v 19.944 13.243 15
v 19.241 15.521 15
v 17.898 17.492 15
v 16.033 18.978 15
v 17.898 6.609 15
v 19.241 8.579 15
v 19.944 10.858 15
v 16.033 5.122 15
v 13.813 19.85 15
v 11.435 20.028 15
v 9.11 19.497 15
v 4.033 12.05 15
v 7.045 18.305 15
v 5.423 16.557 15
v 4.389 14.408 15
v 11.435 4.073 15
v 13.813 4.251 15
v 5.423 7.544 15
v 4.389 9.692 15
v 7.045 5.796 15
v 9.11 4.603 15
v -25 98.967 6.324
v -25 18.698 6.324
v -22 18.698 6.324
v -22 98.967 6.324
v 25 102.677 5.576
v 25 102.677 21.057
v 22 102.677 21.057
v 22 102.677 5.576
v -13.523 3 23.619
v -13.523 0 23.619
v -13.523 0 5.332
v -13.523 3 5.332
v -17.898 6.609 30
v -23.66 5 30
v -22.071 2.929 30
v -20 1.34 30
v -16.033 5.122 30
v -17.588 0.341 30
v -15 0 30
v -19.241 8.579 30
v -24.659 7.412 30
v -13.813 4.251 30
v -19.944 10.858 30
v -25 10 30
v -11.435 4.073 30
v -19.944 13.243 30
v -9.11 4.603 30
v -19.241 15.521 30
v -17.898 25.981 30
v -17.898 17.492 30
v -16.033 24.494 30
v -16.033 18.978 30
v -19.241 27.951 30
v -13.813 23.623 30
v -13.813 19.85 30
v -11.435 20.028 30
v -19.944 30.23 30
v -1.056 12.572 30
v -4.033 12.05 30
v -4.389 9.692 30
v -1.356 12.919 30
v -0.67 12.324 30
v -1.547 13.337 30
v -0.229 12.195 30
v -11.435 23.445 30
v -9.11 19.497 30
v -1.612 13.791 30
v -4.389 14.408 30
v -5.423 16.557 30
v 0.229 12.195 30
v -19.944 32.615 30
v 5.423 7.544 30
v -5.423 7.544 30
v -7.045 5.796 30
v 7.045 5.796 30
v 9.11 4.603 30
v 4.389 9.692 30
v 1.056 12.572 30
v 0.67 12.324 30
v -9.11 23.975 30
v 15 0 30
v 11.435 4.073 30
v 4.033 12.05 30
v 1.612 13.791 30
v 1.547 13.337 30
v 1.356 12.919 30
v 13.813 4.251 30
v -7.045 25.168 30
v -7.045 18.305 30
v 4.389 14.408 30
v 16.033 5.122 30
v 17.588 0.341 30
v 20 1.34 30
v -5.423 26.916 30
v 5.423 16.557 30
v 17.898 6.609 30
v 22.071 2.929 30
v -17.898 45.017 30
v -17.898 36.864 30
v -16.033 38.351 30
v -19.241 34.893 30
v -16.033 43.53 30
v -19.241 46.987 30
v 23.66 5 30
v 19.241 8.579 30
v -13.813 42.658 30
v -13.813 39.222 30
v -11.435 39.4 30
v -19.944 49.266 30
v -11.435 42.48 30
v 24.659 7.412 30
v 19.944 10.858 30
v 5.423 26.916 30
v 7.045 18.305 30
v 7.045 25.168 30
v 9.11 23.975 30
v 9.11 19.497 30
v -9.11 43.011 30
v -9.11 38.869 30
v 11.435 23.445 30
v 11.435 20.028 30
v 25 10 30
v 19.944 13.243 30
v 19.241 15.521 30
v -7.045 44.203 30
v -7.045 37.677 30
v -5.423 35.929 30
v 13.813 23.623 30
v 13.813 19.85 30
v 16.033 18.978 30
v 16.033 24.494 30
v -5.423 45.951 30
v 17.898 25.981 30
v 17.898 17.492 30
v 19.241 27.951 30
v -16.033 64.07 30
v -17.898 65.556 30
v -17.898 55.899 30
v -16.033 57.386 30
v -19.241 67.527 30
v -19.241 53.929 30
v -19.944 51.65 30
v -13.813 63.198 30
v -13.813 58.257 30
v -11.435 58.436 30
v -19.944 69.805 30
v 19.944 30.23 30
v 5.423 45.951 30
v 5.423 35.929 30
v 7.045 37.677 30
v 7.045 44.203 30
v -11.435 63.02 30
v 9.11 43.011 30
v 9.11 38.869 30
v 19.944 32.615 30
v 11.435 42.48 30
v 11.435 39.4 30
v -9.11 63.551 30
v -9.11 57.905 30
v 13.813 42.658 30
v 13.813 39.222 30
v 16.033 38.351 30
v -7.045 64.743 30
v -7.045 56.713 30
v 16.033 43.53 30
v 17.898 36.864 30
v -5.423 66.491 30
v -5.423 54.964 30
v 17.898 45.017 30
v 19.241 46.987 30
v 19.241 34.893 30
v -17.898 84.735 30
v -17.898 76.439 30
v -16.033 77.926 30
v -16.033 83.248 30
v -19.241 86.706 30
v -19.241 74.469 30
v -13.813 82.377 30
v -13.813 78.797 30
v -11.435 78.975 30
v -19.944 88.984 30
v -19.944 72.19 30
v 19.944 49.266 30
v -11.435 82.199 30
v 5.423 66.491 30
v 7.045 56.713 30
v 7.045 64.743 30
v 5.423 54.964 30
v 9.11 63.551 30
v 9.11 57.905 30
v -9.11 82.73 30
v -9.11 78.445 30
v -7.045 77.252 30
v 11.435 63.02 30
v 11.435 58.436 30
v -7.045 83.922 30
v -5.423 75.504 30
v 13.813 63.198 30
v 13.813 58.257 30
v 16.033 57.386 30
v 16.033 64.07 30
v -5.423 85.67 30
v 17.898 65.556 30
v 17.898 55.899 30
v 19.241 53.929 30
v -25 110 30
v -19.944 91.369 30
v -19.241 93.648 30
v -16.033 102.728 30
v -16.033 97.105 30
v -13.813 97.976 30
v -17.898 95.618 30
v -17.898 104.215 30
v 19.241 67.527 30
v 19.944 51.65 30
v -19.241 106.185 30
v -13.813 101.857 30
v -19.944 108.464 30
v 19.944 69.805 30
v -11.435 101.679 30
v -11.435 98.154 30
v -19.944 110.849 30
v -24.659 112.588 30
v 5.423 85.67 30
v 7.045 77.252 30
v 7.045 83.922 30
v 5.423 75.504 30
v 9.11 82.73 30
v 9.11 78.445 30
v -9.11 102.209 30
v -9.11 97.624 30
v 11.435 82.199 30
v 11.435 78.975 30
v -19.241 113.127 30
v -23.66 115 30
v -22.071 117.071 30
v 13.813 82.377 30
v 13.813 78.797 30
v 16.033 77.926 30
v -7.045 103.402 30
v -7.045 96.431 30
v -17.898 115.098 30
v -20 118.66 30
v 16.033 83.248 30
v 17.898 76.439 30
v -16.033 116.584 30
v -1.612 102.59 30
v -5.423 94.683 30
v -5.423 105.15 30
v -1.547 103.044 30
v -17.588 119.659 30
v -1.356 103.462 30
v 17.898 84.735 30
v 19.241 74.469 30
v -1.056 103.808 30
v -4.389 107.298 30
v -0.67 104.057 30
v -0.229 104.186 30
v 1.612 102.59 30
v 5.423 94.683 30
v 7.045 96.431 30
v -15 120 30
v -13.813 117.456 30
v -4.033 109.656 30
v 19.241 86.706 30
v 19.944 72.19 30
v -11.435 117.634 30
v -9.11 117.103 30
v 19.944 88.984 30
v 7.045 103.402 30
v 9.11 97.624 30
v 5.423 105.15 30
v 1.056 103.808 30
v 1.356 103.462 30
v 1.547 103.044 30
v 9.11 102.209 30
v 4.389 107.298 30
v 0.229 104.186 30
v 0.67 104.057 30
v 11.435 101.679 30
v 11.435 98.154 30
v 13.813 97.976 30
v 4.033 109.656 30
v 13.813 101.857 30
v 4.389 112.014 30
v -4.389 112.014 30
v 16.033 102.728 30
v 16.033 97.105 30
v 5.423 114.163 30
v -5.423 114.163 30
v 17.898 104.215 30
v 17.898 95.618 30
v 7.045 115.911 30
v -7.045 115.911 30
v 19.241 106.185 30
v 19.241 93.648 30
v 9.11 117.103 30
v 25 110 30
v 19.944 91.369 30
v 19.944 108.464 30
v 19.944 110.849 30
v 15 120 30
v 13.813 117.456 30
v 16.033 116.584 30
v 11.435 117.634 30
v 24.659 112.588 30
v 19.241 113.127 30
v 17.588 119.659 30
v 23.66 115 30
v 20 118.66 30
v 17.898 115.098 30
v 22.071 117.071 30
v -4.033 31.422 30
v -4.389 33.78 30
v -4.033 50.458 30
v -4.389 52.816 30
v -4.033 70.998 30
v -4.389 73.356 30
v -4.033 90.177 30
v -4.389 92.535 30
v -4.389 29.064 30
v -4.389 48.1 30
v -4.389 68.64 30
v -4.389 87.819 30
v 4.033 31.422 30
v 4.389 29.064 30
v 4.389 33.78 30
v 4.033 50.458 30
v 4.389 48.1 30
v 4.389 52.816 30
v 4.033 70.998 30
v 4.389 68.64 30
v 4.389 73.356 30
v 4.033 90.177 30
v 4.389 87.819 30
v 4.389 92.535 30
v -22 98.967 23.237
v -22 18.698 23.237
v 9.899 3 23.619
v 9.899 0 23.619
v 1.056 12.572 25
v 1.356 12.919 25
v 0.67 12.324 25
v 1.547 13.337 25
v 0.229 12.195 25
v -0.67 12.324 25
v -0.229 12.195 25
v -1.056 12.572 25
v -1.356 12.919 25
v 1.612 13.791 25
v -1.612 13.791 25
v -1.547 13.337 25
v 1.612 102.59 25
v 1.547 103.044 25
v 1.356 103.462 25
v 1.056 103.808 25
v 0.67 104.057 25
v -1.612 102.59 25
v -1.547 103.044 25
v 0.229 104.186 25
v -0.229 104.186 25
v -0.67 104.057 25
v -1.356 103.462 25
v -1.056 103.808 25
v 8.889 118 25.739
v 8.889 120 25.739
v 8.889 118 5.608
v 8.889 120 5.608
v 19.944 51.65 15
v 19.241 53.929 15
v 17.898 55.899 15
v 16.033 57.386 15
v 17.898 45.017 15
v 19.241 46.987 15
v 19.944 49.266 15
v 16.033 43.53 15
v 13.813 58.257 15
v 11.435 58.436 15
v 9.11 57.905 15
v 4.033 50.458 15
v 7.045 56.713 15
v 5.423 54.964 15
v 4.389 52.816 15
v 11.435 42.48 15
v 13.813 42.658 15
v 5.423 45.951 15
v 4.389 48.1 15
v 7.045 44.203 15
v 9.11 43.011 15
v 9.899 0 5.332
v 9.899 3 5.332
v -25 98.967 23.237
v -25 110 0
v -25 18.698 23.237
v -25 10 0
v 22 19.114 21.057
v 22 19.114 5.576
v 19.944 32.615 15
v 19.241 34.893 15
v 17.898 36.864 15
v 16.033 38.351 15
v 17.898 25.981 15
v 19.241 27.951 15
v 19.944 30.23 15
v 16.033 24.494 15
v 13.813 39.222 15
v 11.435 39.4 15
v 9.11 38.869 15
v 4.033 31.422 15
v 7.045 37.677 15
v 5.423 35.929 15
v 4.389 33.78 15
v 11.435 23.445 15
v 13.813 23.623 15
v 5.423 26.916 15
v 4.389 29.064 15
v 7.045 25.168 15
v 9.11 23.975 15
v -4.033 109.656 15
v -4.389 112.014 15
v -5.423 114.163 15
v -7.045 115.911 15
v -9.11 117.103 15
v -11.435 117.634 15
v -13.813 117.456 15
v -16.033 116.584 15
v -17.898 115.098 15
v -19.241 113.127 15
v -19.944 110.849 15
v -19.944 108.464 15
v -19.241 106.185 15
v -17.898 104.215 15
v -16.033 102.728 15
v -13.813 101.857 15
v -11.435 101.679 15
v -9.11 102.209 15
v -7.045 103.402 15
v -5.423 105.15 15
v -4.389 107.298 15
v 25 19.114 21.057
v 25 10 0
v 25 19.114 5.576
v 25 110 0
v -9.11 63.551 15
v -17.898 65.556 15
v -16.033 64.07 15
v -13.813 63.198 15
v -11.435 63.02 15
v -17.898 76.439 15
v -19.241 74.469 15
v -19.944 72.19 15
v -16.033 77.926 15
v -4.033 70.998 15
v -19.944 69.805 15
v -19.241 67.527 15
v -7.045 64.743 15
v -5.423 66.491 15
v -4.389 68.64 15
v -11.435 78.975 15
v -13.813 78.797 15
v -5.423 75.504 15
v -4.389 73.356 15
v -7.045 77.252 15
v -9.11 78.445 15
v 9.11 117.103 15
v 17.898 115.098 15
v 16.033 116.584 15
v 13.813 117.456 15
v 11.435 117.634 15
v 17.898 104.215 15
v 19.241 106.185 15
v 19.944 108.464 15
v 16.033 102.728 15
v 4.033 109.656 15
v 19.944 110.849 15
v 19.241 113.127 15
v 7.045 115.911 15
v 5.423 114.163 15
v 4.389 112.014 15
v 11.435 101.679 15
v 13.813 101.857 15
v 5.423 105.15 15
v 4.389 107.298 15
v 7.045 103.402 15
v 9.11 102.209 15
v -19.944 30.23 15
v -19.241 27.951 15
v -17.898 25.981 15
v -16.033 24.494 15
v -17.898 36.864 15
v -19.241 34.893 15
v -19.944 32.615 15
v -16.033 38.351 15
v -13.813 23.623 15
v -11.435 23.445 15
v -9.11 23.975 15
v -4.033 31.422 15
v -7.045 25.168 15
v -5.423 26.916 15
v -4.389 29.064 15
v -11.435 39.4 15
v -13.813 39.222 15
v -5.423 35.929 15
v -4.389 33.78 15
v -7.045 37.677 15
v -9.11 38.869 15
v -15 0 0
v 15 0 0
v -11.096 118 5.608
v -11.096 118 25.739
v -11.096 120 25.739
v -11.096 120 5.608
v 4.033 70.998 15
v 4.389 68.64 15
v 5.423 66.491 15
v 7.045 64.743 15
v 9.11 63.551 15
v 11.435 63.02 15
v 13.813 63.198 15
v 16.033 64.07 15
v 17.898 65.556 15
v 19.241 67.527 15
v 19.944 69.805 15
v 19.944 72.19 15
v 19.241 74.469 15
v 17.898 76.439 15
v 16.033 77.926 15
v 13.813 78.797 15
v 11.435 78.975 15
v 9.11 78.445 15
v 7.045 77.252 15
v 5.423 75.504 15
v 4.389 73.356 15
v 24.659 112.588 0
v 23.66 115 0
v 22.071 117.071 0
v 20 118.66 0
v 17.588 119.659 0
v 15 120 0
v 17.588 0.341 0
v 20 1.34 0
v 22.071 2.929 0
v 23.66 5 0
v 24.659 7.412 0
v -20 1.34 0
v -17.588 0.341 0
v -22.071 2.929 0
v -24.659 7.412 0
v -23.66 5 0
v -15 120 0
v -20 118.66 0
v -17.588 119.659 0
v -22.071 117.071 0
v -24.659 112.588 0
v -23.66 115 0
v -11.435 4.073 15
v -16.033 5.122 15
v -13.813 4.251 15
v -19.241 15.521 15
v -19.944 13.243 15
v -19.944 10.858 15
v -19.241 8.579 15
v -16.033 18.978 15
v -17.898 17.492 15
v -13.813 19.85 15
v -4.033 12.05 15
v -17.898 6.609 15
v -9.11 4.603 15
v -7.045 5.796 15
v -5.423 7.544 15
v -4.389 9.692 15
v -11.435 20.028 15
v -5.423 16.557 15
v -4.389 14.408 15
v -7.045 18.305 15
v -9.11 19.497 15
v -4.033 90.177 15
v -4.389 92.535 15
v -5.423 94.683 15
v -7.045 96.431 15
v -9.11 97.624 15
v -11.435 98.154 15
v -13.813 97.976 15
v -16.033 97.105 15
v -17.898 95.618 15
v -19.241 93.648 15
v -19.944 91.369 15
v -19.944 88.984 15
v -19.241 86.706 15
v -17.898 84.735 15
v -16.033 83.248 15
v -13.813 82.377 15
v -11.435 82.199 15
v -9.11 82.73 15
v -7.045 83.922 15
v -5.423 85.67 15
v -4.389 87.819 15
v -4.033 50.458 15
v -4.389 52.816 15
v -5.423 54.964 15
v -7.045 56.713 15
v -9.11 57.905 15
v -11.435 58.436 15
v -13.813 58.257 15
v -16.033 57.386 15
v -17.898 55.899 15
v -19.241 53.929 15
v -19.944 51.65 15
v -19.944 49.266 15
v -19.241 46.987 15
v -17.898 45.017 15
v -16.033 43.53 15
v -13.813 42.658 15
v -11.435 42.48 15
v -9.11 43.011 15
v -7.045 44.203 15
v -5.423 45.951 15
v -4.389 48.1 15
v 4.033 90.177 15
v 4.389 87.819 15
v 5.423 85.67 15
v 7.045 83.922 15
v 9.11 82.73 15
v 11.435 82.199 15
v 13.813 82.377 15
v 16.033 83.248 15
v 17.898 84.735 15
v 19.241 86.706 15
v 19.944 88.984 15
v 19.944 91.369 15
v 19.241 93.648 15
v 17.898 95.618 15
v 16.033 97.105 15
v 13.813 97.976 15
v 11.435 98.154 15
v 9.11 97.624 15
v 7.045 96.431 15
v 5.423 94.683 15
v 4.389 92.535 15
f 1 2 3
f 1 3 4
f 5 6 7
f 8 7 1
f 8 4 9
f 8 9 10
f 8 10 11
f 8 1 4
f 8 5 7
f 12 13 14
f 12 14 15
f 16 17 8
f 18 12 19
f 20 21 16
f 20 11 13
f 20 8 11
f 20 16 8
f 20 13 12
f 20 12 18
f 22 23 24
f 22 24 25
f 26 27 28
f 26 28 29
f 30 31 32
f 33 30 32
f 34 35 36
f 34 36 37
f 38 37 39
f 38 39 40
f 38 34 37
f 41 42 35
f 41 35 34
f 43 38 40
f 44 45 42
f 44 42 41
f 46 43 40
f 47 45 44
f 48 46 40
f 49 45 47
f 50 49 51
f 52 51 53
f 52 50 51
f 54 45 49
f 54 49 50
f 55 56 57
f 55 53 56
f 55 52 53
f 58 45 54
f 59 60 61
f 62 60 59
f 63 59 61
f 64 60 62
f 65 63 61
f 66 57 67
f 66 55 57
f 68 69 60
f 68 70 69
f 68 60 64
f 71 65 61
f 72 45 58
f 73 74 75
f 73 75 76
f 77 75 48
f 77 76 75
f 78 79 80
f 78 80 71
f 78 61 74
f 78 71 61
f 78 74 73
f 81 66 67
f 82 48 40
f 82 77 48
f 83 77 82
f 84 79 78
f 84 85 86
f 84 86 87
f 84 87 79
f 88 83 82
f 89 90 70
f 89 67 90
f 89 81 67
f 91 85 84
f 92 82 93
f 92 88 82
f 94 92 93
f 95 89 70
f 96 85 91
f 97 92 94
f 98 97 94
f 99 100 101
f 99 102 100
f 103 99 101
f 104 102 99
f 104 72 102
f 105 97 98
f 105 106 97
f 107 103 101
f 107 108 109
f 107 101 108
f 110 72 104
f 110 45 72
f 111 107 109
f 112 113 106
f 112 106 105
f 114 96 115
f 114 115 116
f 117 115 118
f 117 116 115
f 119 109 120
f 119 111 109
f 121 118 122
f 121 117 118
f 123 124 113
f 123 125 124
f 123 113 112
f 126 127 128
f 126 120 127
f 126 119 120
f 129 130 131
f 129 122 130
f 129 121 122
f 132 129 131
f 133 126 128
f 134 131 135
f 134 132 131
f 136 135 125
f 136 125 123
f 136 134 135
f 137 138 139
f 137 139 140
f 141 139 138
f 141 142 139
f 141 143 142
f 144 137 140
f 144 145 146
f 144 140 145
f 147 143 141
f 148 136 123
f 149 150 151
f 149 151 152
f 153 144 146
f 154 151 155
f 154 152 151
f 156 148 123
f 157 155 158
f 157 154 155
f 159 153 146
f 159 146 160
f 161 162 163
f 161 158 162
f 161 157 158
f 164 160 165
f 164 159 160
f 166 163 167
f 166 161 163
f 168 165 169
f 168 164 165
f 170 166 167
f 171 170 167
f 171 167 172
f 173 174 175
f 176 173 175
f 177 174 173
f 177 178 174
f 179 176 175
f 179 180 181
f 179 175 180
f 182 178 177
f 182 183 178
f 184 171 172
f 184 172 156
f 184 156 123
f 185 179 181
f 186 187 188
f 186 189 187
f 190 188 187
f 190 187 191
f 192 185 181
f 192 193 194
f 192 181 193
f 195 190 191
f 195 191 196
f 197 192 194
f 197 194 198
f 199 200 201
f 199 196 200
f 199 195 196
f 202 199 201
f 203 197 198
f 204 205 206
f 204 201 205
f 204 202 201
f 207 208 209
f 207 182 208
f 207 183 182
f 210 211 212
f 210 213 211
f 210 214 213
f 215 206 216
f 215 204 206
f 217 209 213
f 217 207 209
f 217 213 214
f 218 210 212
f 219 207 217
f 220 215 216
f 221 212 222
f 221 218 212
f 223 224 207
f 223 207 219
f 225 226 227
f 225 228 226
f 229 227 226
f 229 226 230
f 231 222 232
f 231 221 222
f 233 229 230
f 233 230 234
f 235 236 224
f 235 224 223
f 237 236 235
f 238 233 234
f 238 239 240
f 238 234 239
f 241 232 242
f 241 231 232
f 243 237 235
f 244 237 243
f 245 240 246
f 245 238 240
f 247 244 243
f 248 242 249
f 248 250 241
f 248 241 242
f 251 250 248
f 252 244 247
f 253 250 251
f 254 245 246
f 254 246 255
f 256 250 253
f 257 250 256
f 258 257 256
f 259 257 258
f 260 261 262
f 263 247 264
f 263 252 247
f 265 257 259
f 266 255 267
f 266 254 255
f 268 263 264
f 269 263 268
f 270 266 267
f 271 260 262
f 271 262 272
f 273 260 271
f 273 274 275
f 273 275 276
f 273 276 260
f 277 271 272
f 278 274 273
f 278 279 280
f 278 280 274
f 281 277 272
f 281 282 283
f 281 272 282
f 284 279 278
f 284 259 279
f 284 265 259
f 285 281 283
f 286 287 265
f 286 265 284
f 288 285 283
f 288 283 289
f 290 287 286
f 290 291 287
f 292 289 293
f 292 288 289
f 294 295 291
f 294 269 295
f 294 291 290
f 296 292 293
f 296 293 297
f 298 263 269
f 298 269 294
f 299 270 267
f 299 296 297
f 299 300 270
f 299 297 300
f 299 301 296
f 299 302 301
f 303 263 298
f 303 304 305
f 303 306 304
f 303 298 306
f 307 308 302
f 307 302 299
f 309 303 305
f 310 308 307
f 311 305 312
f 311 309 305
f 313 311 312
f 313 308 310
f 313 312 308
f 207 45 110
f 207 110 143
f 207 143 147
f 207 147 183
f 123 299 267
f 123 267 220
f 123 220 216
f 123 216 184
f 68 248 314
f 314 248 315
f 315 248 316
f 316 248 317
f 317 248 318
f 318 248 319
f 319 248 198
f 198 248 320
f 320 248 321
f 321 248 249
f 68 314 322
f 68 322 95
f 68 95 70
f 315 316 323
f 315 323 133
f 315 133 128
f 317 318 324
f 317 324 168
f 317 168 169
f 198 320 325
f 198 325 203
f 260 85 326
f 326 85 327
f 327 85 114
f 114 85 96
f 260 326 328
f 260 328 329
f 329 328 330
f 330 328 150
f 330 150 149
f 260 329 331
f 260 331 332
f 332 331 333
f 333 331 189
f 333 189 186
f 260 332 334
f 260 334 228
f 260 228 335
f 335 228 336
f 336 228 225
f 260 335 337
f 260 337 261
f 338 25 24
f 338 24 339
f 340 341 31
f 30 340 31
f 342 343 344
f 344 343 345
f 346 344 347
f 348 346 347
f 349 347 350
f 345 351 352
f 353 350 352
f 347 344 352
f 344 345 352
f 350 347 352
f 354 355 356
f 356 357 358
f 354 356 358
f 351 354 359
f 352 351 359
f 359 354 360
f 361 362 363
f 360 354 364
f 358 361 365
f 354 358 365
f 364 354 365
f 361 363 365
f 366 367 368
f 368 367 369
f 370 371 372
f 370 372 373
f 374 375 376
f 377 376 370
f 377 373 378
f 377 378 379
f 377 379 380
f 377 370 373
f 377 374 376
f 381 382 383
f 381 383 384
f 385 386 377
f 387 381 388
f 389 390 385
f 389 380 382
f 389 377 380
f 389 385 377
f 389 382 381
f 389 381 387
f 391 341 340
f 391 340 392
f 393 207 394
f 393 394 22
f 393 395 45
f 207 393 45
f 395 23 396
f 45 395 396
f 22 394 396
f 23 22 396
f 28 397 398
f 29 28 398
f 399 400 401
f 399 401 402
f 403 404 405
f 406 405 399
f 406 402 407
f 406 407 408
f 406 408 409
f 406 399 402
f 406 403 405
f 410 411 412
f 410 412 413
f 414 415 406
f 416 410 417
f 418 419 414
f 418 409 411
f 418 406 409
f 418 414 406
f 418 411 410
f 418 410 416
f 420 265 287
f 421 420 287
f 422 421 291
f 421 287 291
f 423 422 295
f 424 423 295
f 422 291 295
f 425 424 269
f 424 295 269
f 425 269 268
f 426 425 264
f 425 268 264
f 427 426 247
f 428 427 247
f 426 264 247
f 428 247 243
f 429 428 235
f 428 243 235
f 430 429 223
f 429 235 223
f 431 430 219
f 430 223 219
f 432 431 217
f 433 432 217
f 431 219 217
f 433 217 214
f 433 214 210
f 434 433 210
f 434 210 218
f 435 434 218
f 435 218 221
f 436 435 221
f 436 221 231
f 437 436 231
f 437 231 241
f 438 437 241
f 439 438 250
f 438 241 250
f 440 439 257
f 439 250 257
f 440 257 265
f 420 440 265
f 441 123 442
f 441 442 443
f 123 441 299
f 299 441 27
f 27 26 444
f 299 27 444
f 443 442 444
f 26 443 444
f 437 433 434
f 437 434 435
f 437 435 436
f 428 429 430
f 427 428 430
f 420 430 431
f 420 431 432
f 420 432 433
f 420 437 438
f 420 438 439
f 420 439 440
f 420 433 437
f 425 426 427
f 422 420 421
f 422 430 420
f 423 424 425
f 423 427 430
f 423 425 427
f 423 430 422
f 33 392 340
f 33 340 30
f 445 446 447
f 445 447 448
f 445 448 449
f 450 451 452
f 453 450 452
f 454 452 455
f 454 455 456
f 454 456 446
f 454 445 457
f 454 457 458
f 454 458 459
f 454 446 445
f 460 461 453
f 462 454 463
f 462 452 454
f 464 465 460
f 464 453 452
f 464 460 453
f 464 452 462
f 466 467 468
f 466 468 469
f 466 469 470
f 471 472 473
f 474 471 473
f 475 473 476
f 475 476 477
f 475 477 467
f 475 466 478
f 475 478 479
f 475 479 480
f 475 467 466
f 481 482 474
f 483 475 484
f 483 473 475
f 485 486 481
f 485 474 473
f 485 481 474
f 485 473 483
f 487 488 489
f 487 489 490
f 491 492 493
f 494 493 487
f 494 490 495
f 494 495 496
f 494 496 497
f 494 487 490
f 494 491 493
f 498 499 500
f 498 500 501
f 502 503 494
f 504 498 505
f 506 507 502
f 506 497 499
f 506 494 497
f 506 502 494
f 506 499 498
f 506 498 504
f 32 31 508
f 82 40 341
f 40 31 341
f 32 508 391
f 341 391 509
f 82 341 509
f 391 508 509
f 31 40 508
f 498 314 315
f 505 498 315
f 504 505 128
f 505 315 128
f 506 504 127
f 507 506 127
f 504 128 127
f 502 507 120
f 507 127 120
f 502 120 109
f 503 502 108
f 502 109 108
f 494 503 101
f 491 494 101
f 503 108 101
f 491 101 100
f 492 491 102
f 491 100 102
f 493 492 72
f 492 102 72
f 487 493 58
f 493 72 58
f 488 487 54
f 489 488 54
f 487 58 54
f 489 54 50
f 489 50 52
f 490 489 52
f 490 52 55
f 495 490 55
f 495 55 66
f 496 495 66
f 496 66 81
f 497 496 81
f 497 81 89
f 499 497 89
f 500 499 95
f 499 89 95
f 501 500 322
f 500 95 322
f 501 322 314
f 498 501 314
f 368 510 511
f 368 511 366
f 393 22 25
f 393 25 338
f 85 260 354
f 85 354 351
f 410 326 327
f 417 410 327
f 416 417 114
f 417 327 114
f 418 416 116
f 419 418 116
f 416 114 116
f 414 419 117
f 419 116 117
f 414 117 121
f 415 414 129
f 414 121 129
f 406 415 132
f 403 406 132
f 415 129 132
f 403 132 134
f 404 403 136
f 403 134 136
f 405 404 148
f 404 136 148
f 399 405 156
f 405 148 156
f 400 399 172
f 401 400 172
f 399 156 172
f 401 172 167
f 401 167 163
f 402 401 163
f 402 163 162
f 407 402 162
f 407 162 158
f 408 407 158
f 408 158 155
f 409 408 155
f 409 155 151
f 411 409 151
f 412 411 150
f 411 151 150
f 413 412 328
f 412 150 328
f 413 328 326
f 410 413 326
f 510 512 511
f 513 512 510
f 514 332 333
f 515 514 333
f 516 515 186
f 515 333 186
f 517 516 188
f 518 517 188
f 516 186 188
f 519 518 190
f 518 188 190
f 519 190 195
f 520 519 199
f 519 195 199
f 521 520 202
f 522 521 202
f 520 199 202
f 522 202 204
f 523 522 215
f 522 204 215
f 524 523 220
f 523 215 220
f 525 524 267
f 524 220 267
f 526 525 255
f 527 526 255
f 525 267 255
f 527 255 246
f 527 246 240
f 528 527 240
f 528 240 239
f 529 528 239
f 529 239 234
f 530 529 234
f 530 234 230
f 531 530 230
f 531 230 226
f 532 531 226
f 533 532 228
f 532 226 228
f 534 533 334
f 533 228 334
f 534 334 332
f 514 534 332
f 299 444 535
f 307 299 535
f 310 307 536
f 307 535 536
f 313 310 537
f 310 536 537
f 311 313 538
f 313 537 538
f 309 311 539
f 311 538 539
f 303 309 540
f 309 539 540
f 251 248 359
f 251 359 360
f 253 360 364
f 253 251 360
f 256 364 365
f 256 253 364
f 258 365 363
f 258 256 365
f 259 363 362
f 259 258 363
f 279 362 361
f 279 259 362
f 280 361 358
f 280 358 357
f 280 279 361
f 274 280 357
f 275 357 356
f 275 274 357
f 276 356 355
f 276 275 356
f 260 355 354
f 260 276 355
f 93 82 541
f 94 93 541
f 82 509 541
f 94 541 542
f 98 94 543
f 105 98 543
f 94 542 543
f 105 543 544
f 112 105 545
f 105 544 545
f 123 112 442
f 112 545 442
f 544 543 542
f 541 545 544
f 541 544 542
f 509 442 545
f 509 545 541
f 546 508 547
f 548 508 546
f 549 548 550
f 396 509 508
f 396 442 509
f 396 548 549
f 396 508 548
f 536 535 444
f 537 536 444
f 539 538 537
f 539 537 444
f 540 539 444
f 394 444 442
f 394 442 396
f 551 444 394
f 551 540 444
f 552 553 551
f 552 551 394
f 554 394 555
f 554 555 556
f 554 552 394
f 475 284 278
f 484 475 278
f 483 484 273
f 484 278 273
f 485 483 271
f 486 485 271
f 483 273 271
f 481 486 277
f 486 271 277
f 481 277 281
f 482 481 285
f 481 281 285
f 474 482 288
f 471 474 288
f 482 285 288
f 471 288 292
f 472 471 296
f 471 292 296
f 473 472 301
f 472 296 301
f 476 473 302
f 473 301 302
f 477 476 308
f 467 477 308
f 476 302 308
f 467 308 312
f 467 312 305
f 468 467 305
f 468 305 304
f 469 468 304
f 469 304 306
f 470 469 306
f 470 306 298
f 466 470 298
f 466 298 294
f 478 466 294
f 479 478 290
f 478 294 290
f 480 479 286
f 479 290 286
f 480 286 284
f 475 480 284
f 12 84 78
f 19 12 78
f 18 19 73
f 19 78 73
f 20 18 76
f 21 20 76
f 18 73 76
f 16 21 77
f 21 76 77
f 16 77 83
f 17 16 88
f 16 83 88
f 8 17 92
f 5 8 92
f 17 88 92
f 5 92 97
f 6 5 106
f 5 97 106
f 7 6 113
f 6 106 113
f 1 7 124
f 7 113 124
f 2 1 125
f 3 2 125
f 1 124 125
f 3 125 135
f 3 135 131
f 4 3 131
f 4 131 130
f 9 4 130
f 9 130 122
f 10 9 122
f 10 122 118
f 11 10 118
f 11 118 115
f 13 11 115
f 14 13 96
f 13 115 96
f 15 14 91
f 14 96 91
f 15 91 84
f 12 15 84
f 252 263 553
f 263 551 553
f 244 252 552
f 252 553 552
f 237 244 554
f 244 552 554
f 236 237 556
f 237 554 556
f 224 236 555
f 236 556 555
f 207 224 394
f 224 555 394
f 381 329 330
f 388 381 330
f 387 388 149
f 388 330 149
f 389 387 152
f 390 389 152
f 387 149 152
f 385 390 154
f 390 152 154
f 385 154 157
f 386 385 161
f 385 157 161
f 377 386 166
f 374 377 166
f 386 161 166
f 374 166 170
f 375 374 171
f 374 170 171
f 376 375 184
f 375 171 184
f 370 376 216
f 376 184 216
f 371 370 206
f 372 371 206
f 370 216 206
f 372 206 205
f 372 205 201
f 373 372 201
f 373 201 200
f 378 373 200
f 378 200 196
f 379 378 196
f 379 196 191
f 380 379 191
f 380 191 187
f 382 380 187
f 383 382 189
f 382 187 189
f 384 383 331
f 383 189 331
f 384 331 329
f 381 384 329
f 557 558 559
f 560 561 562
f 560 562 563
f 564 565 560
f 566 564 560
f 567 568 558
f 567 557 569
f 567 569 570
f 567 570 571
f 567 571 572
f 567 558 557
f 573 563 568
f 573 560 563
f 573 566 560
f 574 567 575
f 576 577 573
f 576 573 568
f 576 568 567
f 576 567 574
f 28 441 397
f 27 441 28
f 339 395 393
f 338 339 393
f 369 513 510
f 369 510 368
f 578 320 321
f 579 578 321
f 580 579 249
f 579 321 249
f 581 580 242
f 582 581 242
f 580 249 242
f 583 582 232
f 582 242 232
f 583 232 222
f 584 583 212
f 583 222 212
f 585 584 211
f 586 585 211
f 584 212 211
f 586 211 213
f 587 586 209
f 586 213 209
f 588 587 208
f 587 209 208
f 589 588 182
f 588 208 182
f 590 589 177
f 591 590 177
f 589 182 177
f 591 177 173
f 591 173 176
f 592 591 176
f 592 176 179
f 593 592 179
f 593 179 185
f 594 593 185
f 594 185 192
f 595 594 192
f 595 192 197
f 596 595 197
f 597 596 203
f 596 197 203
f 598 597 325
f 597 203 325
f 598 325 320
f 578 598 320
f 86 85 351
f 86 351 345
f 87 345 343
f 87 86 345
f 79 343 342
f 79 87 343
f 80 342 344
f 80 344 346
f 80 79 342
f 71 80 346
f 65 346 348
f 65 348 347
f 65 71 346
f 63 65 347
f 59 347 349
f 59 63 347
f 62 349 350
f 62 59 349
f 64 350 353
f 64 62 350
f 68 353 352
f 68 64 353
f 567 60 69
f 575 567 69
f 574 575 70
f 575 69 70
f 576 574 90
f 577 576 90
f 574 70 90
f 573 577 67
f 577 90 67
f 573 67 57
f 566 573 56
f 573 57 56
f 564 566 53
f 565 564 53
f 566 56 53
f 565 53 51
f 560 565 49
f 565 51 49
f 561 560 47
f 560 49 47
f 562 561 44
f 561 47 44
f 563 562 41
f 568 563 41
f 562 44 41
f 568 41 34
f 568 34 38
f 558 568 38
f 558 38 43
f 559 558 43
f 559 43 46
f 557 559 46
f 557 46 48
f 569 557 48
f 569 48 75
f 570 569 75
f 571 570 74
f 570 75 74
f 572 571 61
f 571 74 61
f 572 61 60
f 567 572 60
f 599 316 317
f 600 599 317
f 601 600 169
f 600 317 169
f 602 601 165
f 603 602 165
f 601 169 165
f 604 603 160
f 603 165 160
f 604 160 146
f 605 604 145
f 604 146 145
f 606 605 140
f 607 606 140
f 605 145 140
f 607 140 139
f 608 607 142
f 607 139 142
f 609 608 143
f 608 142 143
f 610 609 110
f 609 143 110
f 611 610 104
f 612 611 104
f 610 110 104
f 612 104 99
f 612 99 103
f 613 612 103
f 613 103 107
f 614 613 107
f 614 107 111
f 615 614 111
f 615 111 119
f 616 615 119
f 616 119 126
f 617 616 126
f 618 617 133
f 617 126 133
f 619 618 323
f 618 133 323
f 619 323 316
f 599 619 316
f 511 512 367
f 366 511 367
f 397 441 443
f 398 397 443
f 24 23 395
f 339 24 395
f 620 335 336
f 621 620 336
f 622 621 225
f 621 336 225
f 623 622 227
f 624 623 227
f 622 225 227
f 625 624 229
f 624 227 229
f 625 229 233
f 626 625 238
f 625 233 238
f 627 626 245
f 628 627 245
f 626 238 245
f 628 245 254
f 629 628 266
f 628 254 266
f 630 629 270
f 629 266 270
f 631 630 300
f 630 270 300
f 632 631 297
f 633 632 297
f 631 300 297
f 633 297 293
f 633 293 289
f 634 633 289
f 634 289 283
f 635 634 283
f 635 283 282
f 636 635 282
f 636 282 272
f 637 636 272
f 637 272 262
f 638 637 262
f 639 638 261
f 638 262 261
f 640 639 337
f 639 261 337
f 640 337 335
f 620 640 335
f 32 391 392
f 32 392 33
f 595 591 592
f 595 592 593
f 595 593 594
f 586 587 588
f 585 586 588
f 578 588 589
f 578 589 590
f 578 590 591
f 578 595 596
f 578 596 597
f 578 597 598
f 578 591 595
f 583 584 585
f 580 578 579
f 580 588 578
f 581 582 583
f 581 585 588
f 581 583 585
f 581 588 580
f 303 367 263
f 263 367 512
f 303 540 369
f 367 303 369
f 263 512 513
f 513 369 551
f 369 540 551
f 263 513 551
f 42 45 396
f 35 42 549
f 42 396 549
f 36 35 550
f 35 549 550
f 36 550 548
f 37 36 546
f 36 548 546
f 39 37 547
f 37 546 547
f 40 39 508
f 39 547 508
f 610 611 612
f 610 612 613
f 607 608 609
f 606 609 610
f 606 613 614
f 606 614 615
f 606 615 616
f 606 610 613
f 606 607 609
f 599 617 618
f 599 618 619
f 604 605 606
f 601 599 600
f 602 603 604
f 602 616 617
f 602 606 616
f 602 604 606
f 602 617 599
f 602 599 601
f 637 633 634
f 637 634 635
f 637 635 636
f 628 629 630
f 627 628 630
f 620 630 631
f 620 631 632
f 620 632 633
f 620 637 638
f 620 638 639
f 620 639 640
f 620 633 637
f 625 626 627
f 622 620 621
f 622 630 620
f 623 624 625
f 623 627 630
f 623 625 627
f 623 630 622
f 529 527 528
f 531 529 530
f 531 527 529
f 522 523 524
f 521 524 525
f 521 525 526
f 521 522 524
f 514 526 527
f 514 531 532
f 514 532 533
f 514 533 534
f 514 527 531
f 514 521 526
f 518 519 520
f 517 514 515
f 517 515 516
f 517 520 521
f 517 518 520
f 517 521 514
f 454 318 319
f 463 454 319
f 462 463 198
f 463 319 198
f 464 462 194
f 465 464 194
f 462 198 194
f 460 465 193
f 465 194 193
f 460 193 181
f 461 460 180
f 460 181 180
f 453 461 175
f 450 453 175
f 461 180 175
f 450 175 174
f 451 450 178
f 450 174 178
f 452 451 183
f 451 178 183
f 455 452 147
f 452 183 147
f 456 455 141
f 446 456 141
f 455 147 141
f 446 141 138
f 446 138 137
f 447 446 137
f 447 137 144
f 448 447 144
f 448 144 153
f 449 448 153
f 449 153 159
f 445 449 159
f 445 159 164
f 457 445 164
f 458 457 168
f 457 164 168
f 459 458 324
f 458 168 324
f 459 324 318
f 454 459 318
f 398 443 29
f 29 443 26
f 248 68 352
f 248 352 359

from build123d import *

# Parameters (mm, degrees)
BOSS_EXTRUDE4_DEPTH = 15
BOSS_EXTRUDE5_DEPTH = 15
SKETCH3_R           = 8
CUT_EXTRUDE2_DEPTH  = 15
CUT_EXTRUDE3_DEPTH  = 5
SKETCH5_W           = 23.42124253
SKETCH5_H           = 18.287225632
CUT_EXTRUDE5_DEPTH  = 3
SKETCH6_W           = 19.984458363
SKETCH6_H           = 20.131216134
CUT_EXTRUDE7_DEPTH  = 2
SKETCH7_W           = 16.913194531
SKETCH7_H           = 80.268822813
CUT_EXTRUDE8_DEPTH  = 3
SKETCH8_W           = 15.481131963
SKETCH8_H           = 83.563031186
CUT_EXTRUDE9_DEPTH  = 3


with BuildPart() as part:
    # Sketch1 → Boss-Extrude4 (new body)
    with BuildSketch(Plane.XY):
        with BuildLine():
            Line((-15, 120), (15, 120))
            ThreePointArc((15, 120), (22.071067812, 117.071067812), (25, 110))
            Line((25, 110), (25, 10))
            ThreePointArc((25, 10), (22.071067812, 2.928932188), (15, 0))
            Line((15, 0), (-15, 0))
            ThreePointArc((-15, 0), (-22.071067812, 2.928932188), (-25, 10))
            Line((-25, 10), (-25, 110))
            ThreePointArc((-25, 110), (-22.071067812, 117.071067812), (-15, 120))
        make_face()
    extrude(amount=BOSS_EXTRUDE4_DEPTH)

    # Sketch2 → Boss-Extrude5 (add)
    with BuildSketch(Plane.XY.offset(15)):
        with BuildLine():
            Line((15, 120), (0, 120))
            Line((0, 120), (0, 0))
            Line((0, 0), (15, 0))
            ThreePointArc((15, 0), (22.071067812, 2.928932188), (25, 10))
            Line((25, 10), (25, 110))
            ThreePointArc((25, 110), (22.071067812, 117.071067812), (15, 120))
        make_face()
        with BuildLine():
            Line((0, 0), (0, 120))
            Line((0, 120), (-15, 120))
            ThreePointArc((-15, 120), (-22.071067812, 117.071067812), (-25, 110))
            Line((-25, 110), (-25, 10))
            ThreePointArc((-25, 10), (-22.071067812, 2.928932188), (-15, 0))
            Line((-15, 0), (0, 0))
        make_face()
    extrude(amount=BOSS_EXTRUDE5_DEPTH)

    # Sketch3 → Cut-Extrude2 (cut)
    with BuildSketch(Plane.XY.offset(30)):
        with Locations((-12.033216968, 109.656218371)):
            Circle(SKETCH3_R)
        with Locations((-12.033216968, 90.176581151)):
            Circle(SKETCH3_R)
        with Locations((-12.033216968, 70.997837903)):
            Circle(SKETCH3_R)
        with Locations((-12.033216968, 50.457885697)):
            Circle(SKETCH3_R)
        with Locations((-12.033216968, 31.422403349)):
            Circle(SKETCH3_R)
        with Locations((-12.033216968, 12.050211805)):
            Circle(SKETCH3_R)
        with Locations(Location((12.033216968, 12.050211805, 0), (0, 0, 180))):
            Circle(SKETCH3_R)
        with Locations(Location((12.033216968, 31.422403349, 0), (0, 0, 180))):
            Circle(SKETCH3_R)
        with Locations(Location((12.033216968, 50.457885697, 0), (0, 0, 180))):
            Circle(SKETCH3_R)
        with Locations(Location((12.033216968, 70.997837903, 0), (0, 0, 180))):
            Circle(SKETCH3_R)
        with Locations(Location((12.033216968, 90.176581151, 0), (0, 0, 180))):
            Circle(SKETCH3_R)
        with Locations(Location((12.033216968, 109.656218371, 0), (0, 0, 180))):
            Circle(SKETCH3_R)
    extrude(amount=-CUT_EXTRUDE2_DEPTH, mode=Mode.SUBTRACT)

    # Sketch4 → Cut-Extrude3 (cut)
    with BuildSketch(Plane.XY.offset(30)):
        with BuildLine():
            Line((-1.612294676, 13.790891011), (-1.612294676, 102.589988378))
            ThreePointArc((-1.612294676, 102.589988378), (0, 104.202283053), (1.612294676, 102.589988378))
            Line((1.612294676, 102.589988378), (1.612294676, 13.790891011))
            ThreePointArc((1.612294676, 13.790891011), (0, 12.178596336), (-1.612294676, 13.790891011))
        make_face()
    extrude(amount=-CUT_EXTRUDE3_DEPTH, mode=Mode.SUBTRACT)

    # Sketch5 → Cut-Extrude5 (cut)
    with BuildSketch(Plane(origin=(0, 0, 0), x_dir=(-1, 0, 0), z_dir=(0, -1, 0))):
        with Locations((1.812031263, -14.475485378)):
            Rectangle(SKETCH5_W, SKETCH5_H)
    extrude(amount=-CUT_EXTRUDE5_DEPTH, mode=Mode.SUBTRACT)

    # Sketch6 → Cut-Extrude7 (cut)
    with BuildSketch(Plane(origin=(0, 120, 0), x_dir=(1, 0, 0), z_dir=(0, 1, 0))):
        with Locations((-1.103321986, -15.673777661)):
            Rectangle(SKETCH6_W, SKETCH6_H)
    extrude(amount=-CUT_EXTRUDE7_DEPTH, mode=Mode.SUBTRACT)

    # Sketch7 → Cut-Extrude8 (cut)
    with BuildSketch(Plane.ZY.offset(25)):
        with Locations((14.78025647, 58.832283621)):
            Rectangle(SKETCH7_W, SKETCH7_H)
    extrude(amount=-CUT_EXTRUDE8_DEPTH, mode=Mode.SUBTRACT)

    # Sketch8 → Cut-Extrude9 (cut)
    with BuildSketch(Plane(origin=(25, 0, 0), x_dir=(0, 0, -1), z_dir=(1, 0, 0))):
        with Locations((-13.31664767, 60.895190622)):
            Rectangle(SKETCH8_W, SKETCH8_H)
    extrude(amount=-CUT_EXTRUDE9_DEPTH, mode=Mode.SUBTRACT)


solid = part.part
